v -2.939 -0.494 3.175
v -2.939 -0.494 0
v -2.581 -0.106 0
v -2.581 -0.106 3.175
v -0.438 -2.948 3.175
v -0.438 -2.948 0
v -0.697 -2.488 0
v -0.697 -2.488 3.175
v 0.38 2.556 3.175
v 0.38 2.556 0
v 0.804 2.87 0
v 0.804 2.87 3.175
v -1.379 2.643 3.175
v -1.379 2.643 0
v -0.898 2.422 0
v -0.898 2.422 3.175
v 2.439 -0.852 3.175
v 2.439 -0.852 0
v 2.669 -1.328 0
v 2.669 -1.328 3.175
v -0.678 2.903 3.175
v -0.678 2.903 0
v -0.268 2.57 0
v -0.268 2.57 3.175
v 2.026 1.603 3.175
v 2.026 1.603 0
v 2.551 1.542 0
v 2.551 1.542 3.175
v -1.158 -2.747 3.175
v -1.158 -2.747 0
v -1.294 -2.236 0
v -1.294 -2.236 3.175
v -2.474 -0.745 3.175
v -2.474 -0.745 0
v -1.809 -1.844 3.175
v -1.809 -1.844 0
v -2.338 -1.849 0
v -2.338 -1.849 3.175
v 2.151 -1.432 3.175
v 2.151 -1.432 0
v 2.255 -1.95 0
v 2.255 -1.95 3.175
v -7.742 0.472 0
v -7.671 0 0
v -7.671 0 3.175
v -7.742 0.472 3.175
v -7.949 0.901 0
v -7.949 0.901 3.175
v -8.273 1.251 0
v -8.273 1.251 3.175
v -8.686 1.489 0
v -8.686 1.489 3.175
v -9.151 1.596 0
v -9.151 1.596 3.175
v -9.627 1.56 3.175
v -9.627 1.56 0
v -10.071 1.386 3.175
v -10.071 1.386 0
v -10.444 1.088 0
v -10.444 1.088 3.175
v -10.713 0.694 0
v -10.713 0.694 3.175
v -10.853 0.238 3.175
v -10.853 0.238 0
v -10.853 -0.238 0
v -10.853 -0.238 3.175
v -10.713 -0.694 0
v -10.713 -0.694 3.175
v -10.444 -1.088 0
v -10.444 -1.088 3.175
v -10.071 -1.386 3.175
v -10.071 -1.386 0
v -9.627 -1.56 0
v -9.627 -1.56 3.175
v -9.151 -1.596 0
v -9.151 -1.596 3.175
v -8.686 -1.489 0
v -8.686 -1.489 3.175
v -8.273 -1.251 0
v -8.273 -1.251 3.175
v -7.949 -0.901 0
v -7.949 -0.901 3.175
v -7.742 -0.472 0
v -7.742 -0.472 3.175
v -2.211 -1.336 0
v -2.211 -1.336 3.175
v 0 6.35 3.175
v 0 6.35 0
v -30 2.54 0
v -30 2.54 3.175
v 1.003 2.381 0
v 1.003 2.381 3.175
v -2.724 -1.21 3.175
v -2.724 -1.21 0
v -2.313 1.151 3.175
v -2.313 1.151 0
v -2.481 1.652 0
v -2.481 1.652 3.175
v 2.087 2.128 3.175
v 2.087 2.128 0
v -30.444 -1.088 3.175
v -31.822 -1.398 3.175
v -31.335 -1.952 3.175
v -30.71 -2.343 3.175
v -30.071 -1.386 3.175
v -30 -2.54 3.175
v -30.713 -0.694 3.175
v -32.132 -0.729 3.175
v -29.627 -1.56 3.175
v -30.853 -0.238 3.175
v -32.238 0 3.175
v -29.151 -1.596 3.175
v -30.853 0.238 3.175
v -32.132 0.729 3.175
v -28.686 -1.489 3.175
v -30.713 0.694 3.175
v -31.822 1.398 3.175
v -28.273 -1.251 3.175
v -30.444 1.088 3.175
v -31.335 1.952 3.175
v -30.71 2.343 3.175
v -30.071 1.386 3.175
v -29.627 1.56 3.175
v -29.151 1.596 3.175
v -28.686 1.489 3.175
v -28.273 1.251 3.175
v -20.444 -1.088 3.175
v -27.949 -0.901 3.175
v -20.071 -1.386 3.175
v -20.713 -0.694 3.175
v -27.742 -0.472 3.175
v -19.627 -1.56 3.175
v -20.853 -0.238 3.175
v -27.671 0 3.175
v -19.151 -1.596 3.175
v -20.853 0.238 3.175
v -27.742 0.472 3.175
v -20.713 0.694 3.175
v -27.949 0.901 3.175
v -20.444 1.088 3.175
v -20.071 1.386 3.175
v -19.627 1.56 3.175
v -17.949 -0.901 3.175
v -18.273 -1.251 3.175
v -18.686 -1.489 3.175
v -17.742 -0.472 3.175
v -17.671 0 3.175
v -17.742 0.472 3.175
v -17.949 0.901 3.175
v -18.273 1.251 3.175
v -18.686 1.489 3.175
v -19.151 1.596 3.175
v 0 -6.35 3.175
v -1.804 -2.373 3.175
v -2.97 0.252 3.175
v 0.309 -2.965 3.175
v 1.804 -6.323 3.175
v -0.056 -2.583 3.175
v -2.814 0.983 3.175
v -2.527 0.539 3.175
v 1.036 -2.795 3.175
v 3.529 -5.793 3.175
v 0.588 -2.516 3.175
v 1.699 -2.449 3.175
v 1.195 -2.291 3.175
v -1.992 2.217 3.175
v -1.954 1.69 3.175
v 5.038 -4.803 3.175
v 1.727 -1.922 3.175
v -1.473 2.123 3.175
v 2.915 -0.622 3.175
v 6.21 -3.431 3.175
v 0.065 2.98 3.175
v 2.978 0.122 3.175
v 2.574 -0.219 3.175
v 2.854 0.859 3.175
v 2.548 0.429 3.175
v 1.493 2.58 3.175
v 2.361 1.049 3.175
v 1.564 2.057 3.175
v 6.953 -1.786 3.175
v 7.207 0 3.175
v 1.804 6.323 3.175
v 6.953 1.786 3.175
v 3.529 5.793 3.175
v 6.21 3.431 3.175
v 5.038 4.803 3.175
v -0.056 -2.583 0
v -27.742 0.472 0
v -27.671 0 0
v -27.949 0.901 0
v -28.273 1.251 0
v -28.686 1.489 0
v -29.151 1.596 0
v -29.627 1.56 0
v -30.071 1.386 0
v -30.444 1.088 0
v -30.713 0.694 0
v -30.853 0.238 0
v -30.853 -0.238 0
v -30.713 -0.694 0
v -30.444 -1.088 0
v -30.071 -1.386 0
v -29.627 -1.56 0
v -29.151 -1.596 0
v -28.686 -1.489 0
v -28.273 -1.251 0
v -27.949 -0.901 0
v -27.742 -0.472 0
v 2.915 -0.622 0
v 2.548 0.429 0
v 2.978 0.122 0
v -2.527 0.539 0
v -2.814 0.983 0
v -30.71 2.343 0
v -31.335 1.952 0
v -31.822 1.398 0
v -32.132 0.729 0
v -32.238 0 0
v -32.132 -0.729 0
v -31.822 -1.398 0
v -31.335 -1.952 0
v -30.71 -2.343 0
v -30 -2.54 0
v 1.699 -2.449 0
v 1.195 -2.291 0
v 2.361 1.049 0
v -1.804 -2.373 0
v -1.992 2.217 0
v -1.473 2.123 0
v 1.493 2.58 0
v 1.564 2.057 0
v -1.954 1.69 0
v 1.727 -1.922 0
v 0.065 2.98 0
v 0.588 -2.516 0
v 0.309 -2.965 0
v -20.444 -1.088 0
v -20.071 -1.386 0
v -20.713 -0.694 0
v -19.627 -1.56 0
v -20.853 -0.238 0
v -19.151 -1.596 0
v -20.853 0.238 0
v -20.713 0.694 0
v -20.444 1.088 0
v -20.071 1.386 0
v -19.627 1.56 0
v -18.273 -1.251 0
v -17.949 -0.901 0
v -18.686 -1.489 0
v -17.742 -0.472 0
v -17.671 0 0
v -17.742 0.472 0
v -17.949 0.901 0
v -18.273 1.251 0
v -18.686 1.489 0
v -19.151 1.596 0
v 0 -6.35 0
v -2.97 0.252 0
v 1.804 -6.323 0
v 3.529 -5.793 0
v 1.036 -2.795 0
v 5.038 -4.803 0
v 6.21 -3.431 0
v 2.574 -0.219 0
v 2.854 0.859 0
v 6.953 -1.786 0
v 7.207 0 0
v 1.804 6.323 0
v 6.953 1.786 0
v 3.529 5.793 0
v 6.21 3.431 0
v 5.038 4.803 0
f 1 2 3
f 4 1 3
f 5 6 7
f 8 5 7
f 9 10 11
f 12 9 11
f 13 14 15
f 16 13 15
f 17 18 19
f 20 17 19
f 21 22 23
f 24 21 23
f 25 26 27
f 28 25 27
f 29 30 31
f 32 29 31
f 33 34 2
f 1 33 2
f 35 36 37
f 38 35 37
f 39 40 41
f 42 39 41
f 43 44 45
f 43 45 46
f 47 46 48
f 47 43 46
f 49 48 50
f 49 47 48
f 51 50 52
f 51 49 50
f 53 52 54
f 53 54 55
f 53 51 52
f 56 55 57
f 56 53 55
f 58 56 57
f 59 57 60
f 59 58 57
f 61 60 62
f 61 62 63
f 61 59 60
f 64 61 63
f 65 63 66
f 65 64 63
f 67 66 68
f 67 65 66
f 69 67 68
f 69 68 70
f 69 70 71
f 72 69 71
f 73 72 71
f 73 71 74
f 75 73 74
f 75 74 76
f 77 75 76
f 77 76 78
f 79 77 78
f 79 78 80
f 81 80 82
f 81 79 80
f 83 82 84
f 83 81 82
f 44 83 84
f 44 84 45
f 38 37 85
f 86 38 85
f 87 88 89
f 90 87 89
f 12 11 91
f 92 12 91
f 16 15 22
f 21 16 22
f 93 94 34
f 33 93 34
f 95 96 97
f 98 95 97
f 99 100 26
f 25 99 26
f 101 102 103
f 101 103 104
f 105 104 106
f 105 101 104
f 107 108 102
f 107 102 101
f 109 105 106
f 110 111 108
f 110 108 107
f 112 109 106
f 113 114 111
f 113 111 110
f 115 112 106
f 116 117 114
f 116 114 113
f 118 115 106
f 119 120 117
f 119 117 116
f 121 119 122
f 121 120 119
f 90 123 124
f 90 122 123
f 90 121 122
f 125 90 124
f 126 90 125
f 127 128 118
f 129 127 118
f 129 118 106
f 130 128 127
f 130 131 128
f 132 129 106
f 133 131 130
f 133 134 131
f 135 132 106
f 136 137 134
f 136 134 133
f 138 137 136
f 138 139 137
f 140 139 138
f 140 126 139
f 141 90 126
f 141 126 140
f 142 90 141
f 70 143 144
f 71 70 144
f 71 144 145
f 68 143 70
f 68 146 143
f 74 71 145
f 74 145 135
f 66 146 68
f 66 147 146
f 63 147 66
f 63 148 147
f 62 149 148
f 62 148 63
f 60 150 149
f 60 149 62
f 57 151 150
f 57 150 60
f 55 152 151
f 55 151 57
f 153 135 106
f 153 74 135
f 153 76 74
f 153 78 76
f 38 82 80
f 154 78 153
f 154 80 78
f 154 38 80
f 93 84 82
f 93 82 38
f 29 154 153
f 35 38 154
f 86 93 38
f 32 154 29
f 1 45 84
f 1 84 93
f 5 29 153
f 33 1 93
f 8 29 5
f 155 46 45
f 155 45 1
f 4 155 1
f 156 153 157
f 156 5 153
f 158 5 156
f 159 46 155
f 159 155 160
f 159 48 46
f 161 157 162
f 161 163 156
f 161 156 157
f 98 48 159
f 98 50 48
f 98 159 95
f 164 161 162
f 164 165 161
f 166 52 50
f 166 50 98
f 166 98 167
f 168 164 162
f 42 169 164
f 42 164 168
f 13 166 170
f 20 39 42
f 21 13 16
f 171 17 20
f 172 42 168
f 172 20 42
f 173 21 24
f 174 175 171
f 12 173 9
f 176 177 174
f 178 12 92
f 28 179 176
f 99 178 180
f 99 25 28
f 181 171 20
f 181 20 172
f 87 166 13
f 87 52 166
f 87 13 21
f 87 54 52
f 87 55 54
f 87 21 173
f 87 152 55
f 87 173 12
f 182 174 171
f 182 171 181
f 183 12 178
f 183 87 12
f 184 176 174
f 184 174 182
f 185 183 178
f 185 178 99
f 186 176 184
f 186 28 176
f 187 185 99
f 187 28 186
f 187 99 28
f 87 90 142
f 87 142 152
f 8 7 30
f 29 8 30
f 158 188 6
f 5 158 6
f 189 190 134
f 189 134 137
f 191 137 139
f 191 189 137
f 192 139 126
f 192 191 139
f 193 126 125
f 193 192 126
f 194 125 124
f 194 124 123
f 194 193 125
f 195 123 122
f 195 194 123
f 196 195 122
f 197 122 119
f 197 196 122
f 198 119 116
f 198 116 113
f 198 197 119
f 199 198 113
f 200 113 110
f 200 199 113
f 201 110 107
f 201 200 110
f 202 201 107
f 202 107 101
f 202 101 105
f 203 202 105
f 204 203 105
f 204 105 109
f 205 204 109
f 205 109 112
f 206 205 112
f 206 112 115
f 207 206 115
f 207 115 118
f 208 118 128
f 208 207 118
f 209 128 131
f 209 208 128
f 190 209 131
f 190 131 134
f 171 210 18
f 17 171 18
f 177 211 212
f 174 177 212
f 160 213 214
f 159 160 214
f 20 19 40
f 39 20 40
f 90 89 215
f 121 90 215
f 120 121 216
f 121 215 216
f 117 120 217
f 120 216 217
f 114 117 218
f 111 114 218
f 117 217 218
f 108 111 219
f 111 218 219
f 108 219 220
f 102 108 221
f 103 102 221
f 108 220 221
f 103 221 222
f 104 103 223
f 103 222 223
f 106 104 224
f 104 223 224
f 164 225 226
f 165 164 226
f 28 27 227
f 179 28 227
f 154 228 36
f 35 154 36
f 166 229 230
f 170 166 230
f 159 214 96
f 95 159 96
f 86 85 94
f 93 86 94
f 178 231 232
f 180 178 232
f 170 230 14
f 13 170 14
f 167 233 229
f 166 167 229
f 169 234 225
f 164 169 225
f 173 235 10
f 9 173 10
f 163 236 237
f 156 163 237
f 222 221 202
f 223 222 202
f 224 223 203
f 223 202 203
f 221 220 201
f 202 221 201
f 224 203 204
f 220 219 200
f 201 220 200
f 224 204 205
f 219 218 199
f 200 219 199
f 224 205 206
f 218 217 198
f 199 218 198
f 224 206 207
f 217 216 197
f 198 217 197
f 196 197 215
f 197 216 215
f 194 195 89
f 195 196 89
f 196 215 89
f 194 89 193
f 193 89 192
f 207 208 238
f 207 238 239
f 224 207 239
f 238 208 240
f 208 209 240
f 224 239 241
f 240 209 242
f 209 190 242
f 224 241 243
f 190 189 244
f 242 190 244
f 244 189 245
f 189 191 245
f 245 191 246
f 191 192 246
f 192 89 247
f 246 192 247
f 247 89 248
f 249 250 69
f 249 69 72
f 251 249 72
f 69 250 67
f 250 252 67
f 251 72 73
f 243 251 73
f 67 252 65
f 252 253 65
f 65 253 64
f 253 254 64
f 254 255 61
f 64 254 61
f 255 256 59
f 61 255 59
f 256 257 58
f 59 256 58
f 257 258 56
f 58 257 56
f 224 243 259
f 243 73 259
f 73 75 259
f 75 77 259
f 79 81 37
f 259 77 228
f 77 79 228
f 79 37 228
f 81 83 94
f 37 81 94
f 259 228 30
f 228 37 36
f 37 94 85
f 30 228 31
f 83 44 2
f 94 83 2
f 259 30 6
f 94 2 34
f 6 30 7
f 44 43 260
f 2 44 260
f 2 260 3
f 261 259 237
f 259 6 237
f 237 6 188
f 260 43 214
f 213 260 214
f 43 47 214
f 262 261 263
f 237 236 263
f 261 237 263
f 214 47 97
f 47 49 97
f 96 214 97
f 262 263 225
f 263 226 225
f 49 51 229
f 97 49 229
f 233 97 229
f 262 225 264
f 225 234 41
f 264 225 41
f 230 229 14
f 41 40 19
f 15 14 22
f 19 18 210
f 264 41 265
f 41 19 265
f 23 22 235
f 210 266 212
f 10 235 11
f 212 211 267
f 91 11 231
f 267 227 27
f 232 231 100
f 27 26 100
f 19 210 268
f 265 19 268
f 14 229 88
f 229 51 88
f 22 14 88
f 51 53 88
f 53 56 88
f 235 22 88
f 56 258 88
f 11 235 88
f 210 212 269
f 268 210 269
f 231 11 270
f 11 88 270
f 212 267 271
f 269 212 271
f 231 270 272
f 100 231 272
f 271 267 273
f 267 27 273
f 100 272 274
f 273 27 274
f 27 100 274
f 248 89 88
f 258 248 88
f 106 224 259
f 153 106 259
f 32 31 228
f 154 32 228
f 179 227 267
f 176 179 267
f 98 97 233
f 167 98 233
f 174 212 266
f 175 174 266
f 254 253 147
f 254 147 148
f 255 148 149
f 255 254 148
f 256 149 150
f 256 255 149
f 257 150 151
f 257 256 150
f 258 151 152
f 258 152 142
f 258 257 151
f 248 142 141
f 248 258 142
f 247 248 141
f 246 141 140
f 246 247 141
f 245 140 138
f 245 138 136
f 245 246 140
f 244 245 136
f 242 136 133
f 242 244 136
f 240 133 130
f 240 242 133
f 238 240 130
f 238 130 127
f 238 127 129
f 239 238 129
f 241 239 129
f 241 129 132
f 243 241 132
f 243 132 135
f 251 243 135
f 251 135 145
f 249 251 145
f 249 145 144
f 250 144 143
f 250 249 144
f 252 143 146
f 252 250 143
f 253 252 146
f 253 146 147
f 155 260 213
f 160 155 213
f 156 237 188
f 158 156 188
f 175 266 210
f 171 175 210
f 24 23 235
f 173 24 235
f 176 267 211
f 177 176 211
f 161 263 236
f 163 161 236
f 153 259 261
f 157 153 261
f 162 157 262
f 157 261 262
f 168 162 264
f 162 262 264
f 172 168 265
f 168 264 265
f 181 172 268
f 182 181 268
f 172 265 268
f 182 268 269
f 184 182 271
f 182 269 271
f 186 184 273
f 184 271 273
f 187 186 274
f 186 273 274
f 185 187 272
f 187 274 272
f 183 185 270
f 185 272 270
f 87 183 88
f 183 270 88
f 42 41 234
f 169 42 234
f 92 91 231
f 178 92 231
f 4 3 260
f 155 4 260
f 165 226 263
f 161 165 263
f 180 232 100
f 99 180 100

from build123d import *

# Parameters (mm, degrees)
F0_R     = 1.6
F1_DEPTH = 3.175


with BuildPart() as f1:
    # F0 (on Top) → F1 (new body)
    with BuildSketch(Plane.XY):
        with BuildLine():
            ThreePointArc((0, -6.35), (7.207455, 0), (0, 6.35))
            Line((0, 6.35), (-30, 2.54))
            ThreePointArc((-30, 2.54), (-32.237822, 0), (-30, -2.54))
            Line((-30, -2.54), (0, -6.35))
        make_face()
        with Locations((-29.271, 0)):
            Circle(F0_R, mode=Mode.SUBTRACT)
        with Locations((-19.271, 0)):
            Circle(F0_R, mode=Mode.SUBTRACT)
        with Locations((-9.271, 0)):
            Circle(F0_R, mode=Mode.SUBTRACT)
        Polygon((-2.313127, 1.150841), (-2.481189, 1.651718), (-1.954254, 1.689937), (-1.992473, 2.216873), (-1.472587, 2.122848), (-1.378562, 2.642733), (-0.898392, 2.422372), (-0.678031, 2.902541), (-0.267748, 2.56969), (0.065104, 2.979972), (0.37972, 2.555544), (0.804147, 2.87016), (1.003328, 2.380825), (1.492663, 2.580005), (1.563894, 2.056509), (2.08739, 2.12774), (2.026194, 1.602976), (2.550958, 1.54178), (2.361181, 1.048721), (2.85424, 0.858945), (2.547807, 0.428572), (2.97818, 0.122139), (2.574344, -0.218506), (2.914989, -0.622342), (2.439126, -0.851855), (2.668639, -1.327718), (2.150649, -1.431678), (2.254609, -1.949669), (1.727038, -1.921544), (1.698914, -2.449115), (1.194912, -2.290672), (1.036469, -2.794674), (0.587704, -2.515869), (0.308899, -2.964634), (-0.056431, -2.582985), (-0.43808, -2.948314), (-0.69702, -2.487802), (-1.157533, -2.746742), (-1.293813, -2.236301), (-1.804254, -2.372581), (-1.809311, -1.844285), (-2.337607, -1.849342), (-2.211123, -1.336386), (-2.724079, -1.209903), (-2.474002, -0.744517), (-2.939388, -0.494441), (-2.581431, -0.105868), (-2.970004, 0.252089), (-2.526659, 0.539434), (-2.814004, 0.982779), align=None, mode=Mode.SUBTRACT)
    extrude(amount=F1_DEPTH)


solid = f1.part
